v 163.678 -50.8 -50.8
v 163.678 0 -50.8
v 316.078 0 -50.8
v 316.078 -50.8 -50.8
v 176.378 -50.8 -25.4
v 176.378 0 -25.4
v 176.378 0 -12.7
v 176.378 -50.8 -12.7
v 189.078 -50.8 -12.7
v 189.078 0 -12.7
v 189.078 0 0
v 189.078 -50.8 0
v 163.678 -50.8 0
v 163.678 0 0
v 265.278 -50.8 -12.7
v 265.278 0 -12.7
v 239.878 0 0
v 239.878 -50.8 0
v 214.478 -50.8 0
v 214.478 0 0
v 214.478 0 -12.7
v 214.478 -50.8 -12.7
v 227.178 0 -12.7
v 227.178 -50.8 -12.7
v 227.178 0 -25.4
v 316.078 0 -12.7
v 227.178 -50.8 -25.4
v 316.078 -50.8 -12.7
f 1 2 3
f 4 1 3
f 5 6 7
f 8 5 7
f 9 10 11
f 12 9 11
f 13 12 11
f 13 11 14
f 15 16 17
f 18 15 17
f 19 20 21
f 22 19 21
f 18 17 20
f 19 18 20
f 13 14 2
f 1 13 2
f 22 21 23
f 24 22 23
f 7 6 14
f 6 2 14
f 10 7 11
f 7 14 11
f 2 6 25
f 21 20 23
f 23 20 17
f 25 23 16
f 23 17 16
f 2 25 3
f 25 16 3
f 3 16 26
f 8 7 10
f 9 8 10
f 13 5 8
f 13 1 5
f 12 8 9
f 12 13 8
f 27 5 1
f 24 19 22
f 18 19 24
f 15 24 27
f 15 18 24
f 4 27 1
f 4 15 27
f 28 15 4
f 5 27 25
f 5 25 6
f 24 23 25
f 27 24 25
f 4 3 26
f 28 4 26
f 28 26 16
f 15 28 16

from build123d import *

# Parameters (mm, degrees)
F1_DEPTH = 50.8
F3_DEPTH = 254


with BuildPart() as f1:
    # F0 (on Front) → F1 (new body)
    with BuildSketch(Plane.XZ):
        Polygon((189.078076, 0), (163.678076, 0), (163.678076, -50.8), (316.078076, -50.8), (316.078076, -12.7), (265.278076, -12.7), (239.878068, 0), (214.478076, 0), (214.478076, -12.7), (227.178076, -12.7), (227.178076, -25.4), (176.378076, -25.4), (176.378076, -12.7), (189.078076, -12.7), align=None)
    extrude(amount=F1_DEPTH)

    # F2 (on Right) → F3 (cut)
    with BuildSketch(Plane.YZ):
        Polygon((-42.799003, -42.036999), (-37.211001, -49.911), (-11.811001, -49.911), (-7.239001, -42.036999), align=None)
    extrude(amount=-F3_DEPTH, mode=Mode.SUBTRACT)


solid = f1.part
